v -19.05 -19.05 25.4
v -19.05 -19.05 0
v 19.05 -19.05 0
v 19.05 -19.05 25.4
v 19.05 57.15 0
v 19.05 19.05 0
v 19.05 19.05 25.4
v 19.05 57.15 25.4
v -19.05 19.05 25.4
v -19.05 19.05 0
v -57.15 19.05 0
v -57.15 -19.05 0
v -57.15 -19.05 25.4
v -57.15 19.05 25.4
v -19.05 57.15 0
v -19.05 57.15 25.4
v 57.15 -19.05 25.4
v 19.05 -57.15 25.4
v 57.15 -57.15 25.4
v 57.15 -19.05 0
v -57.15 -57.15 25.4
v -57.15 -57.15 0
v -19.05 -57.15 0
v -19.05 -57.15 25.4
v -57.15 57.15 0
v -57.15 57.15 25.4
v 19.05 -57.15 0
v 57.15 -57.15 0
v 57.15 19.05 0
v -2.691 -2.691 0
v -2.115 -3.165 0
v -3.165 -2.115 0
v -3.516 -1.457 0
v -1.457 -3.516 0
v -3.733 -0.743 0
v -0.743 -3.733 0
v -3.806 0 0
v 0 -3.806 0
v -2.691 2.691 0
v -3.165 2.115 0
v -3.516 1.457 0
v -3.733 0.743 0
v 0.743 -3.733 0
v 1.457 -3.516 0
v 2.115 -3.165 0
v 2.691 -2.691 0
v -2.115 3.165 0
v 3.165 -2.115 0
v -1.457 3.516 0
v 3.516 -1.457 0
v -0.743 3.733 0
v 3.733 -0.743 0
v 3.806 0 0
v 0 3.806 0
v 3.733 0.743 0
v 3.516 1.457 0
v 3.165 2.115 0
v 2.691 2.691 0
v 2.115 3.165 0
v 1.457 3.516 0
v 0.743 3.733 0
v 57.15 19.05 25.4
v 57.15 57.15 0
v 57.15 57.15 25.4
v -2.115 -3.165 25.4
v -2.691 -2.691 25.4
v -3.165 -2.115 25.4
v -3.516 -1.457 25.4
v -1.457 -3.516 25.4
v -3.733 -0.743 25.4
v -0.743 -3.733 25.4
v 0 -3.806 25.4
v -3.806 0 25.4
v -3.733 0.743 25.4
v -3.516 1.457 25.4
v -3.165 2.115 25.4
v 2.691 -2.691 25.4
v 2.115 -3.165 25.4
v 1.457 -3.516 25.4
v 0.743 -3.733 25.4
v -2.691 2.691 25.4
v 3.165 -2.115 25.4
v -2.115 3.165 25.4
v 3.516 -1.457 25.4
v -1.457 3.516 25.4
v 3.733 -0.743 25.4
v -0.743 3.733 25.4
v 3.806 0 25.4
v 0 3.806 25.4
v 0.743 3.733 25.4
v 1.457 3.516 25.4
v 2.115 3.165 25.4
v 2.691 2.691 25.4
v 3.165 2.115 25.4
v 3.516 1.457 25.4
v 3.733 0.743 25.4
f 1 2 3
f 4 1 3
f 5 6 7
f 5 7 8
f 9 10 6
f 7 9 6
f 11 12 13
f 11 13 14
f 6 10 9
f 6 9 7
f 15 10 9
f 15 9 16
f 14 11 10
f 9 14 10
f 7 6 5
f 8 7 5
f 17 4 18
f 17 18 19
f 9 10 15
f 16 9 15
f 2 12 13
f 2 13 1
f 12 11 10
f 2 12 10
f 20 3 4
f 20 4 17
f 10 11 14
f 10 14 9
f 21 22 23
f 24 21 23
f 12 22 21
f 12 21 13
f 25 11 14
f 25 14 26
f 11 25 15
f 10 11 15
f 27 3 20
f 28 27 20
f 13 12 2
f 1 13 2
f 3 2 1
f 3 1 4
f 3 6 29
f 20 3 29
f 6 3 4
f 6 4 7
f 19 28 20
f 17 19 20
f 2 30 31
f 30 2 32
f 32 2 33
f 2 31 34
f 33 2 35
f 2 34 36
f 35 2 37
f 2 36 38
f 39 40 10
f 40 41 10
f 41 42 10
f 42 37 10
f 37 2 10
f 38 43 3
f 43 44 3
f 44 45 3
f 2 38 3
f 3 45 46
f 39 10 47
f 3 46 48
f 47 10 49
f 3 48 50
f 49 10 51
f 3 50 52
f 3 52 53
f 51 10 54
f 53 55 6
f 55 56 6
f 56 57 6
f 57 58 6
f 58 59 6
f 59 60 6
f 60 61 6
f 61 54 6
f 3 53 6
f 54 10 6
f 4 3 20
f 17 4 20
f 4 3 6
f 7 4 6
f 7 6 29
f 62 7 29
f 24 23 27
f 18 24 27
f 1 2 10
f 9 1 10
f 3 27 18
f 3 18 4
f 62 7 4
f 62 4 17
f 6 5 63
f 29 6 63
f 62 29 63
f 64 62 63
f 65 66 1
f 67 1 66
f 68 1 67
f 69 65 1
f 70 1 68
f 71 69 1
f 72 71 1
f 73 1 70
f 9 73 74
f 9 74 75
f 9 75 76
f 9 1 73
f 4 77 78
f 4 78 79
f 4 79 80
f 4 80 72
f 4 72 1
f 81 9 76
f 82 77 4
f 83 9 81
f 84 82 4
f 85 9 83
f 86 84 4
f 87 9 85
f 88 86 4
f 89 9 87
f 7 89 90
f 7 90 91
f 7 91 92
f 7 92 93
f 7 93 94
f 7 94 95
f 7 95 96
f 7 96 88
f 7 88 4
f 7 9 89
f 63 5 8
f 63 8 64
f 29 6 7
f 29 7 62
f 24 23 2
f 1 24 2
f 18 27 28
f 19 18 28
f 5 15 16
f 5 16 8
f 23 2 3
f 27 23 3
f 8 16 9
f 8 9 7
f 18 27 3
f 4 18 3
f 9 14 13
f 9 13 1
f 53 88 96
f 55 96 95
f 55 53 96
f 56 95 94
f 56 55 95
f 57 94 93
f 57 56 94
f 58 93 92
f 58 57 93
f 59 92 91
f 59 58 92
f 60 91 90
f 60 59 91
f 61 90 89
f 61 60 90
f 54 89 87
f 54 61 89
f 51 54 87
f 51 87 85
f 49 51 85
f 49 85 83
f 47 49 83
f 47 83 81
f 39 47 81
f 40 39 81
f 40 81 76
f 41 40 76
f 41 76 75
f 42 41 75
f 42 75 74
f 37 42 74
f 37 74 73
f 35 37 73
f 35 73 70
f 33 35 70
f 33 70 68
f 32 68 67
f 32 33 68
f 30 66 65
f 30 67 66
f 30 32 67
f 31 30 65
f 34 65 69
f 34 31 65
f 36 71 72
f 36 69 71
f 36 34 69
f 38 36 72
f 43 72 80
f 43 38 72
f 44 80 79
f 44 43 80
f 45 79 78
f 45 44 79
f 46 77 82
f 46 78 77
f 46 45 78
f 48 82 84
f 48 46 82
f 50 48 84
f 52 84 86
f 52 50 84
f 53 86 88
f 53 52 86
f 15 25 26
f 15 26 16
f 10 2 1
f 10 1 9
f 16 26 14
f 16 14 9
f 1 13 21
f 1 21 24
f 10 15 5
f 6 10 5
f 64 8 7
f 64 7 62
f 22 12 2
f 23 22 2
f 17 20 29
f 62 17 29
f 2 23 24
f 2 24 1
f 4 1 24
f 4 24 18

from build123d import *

# Parameters (mm, degrees)
F0_W     = 38.1
F0_H     = 38.1
F6_DEPTH = 25.4
F3_W     = 38.1
F3_H     = 38.1
F7_DEPTH = 25.4
F2_W     = 38.1
F2_H     = 38.1
F1_W     = 38.1
F1_H     = 38.1
F4_W     = 38.1
F4_H     = 38.1
F5_W     = 38.1
F5_H     = 38.1
F8_R     = 3.8061602771
F9_DEPTH = 59.436


with BuildPart() as f6:
    # F0 (on Top) → F6 (new body)
    with BuildSketch(Plane.XY):
        with Locations((0, 38.1)):
            Rectangle(F0_W, F0_H)
    extrude(amount=F6_DEPTH)


with BuildPart() as f6b:
    # F0 (on Top) → F6, piece 2 (new body)
    with BuildSketch(Plane.XY):
        with Locations((38.1, 0)):
            Rectangle(F0_W, F0_H)
    extrude(amount=F6_DEPTH)


with BuildPart() as f6c:
    # F0 (on Top) → F6, piece 3 (new body)
    with BuildSketch(Plane.XY):
        with Locations((0, -38.1)):
            Rectangle(F0_W, F0_H)
    extrude(amount=F6_DEPTH)


with BuildPart() as f6d:
    # F0 (on Top) → F6, piece 4 (new body)
    with BuildSketch(Plane.XY):
        with Locations((-38.1, 0)):
            Rectangle(F0_W, F0_H)
    extrude(amount=F6_DEPTH)


with BuildPart() as f7:
    # F3 (on face) → F7 (new body)
    with BuildSketch(Plane.XY):
        Rectangle(F3_W, F3_H)
    extrude(amount=F7_DEPTH)

    # F8 (on Top) → F9 (cut)
    with BuildSketch(Plane.XY):
        Circle(F8_R)
    extrude(amount=F9_DEPTH, mode=Mode.SUBTRACT)


with BuildPart() as f7b:
    # F2 (on face) → F7, piece 2 (new body)
    with BuildSketch(Plane.XY):
        with Locations((-38.1, 38.1)):
            Rectangle(F2_W, F2_H)
    extrude(amount=F7_DEPTH)


with BuildPart() as f7c:
    # F1 (on face) → F7, piece 3 (new body)
    with BuildSketch(Plane.XY):
        with Locations((38.1, 38.1)):
            Rectangle(F1_W, F1_H)
    extrude(amount=F7_DEPTH)


with BuildPart() as f7d:
    # F4 (on face) → F7, piece 4 (new body)
    with BuildSketch(Plane.XY):
        with Locations((38.1, -38.1)):
            Rectangle(F4_W, F4_H)
    extrude(amount=F7_DEPTH)


with BuildPart() as f7e:
    # F5 (on face) → F7, piece 5 (new body)
    with BuildSketch(Plane.XY):
        with Locations((-38.1, -38.1)):
            Rectangle(F5_W, F5_H)
    extrude(amount=F7_DEPTH)


solid = Compound([f6.part, f6b.part, f6c.part, f6d.part, f7.part, f7b.part, f7c.part, f7d.part, f7e.part])
